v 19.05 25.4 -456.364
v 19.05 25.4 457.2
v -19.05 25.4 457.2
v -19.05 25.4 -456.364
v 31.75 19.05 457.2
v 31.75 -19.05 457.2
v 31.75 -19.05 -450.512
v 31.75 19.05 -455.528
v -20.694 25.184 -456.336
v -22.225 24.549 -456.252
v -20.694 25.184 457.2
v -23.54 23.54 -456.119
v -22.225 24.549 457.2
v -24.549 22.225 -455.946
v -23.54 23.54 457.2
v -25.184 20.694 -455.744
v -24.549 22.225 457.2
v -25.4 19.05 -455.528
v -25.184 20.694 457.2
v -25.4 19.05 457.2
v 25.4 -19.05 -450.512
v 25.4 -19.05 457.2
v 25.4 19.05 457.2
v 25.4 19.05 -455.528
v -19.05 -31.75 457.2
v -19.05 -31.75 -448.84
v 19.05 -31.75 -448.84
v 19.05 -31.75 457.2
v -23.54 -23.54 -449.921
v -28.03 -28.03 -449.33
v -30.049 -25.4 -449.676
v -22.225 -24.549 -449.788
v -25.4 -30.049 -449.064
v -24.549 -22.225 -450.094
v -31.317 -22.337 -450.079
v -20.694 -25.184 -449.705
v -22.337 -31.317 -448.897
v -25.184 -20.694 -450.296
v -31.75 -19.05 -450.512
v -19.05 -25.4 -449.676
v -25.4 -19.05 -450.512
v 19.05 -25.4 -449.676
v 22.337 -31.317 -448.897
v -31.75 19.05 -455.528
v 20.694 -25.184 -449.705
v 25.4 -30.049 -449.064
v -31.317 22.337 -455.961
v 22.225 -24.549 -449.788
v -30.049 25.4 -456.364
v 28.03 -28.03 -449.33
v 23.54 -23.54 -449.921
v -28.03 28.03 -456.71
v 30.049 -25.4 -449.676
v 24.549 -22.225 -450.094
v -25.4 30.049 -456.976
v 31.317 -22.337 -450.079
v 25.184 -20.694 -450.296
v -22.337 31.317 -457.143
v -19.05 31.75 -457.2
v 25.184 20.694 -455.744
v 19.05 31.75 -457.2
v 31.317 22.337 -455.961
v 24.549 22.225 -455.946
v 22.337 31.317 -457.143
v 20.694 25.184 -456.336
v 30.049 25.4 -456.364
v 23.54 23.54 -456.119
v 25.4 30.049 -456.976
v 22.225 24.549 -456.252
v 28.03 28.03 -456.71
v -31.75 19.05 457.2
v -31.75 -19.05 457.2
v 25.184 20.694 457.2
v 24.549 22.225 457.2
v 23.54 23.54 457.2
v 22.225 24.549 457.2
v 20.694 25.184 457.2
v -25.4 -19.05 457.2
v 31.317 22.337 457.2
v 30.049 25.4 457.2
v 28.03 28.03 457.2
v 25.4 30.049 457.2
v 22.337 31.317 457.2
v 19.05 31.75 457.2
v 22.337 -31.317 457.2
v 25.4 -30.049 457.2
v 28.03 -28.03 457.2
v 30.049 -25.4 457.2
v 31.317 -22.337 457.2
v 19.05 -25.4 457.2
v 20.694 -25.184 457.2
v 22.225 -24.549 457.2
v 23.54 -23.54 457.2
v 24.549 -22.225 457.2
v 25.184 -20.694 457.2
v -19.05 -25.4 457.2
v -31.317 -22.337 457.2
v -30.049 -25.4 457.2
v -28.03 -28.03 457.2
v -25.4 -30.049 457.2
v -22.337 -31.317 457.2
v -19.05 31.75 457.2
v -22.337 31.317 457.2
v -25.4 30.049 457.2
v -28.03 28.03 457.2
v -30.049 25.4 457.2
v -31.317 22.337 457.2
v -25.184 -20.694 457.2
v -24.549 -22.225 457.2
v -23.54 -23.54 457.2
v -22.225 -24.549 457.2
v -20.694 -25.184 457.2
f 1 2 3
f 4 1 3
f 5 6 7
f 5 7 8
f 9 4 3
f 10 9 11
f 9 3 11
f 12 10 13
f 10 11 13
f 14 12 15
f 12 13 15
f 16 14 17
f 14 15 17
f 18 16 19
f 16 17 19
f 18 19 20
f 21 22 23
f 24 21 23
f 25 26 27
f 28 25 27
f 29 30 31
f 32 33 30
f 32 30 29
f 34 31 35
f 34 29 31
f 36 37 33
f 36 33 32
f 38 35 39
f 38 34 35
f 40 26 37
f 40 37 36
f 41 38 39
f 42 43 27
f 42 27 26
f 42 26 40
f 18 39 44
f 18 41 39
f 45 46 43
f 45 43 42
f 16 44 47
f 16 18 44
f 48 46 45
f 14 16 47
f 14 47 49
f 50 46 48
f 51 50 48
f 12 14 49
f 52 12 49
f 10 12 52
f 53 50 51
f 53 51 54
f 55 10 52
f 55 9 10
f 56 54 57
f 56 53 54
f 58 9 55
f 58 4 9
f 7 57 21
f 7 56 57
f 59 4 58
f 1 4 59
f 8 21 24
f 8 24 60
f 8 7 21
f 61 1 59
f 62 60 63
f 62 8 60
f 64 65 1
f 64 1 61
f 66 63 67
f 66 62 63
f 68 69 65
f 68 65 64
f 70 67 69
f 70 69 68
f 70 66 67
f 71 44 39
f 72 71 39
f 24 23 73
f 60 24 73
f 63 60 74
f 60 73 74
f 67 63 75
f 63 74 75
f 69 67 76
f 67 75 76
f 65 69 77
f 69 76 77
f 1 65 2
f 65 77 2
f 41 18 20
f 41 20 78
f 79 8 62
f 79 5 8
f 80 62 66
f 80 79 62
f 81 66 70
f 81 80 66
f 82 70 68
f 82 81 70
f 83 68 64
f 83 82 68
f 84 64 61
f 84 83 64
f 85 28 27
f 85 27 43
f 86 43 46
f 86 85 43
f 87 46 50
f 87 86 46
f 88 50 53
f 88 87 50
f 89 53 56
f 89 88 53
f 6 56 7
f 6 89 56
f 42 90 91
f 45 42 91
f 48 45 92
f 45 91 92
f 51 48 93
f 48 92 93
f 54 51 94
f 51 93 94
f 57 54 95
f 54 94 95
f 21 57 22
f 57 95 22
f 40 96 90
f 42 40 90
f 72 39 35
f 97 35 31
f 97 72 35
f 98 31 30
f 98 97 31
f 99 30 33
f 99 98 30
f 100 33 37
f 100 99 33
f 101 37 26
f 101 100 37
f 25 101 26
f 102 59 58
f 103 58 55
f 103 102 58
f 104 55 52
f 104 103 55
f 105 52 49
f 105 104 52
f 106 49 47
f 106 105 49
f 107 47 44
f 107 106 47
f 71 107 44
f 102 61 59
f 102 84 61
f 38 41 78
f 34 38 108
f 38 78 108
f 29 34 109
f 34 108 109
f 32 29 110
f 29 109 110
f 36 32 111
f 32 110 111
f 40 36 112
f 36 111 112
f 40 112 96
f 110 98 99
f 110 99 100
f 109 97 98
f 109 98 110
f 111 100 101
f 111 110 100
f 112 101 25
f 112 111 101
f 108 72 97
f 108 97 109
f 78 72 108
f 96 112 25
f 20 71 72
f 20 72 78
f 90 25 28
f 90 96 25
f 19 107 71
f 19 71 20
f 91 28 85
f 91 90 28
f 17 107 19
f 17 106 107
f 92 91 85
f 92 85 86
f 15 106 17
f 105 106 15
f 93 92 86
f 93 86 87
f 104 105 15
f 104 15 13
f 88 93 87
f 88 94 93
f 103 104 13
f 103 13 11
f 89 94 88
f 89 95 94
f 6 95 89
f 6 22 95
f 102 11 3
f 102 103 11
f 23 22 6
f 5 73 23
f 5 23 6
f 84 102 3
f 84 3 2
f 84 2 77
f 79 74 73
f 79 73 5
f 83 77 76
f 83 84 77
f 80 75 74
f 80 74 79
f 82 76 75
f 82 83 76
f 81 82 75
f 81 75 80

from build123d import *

# Parameters (mm, degrees)
BOSS_EXTRUDE1_DEPTH = 457.2
CUT_EXTRUDE1_DEPTH  = 914.4


with BuildPart() as part:
    # Sketch1 → Boss-Extrude1 (new body, symmetric)
    with BuildSketch(Plane.XY):
        with BuildLine():
            Line((19.05, 31.75), (-19.05, 31.75))
            ThreePointArc((-19.05, 31.75), (-28.030256121, 28.030256121), (-31.75, 19.05))
            Line((-31.75, 19.05), (-31.75, -19.05))
            ThreePointArc((-31.75, -19.05), (-28.030256121, -28.030256121), (-19.05, -31.75))
            Line((-19.05, -31.75), (19.05, -31.75))
            ThreePointArc((19.05, -31.75), (28.030256121, -28.030256121), (31.75, -19.05))
            Line((31.75, -19.05), (31.75, 19.05))
            ThreePointArc((31.75, 19.05), (28.030256121, 28.030256121), (19.05, 31.75))
        make_face()
        with BuildLine():
            ThreePointArc((-25.4, -19.05), (-23.540128061, -23.540128061), (-19.05, -25.4))
            Line((-19.05, -25.4), (19.05, -25.4))
            ThreePointArc((19.05, -25.4), (23.540128061, -23.540128061), (25.4, -19.05))
            Line((25.4, -19.05), (25.4, 19.05))
            ThreePointArc((25.4, 19.05), (23.540128061, 23.540128061), (19.05, 25.4))
            Line((19.05, 25.4), (-19.05, 25.4))
            ThreePointArc((-19.05, 25.4), (-23.540128061, 23.540128061), (-25.4, 19.05))
            Line((-25.4, 19.05), (-25.4, -19.05))
        make_face(mode=Mode.SUBTRACT)
    extrude(amount=BOSS_EXTRUDE1_DEPTH, both=True)

    # Sketch2 → Cut-Extrude1 (cut)
    with BuildSketch(Plane(origin=(31.75, 0, 0), x_dir=(0, 0, -1), z_dir=(1, 0, 0))):
        Polygon((457.2, 31.75), (457.2, -68.178184421), (444.044204942, -68.178184421), align=None)
    extrude(amount=-CUT_EXTRUDE1_DEPTH, mode=Mode.SUBTRACT)


solid = part.part
